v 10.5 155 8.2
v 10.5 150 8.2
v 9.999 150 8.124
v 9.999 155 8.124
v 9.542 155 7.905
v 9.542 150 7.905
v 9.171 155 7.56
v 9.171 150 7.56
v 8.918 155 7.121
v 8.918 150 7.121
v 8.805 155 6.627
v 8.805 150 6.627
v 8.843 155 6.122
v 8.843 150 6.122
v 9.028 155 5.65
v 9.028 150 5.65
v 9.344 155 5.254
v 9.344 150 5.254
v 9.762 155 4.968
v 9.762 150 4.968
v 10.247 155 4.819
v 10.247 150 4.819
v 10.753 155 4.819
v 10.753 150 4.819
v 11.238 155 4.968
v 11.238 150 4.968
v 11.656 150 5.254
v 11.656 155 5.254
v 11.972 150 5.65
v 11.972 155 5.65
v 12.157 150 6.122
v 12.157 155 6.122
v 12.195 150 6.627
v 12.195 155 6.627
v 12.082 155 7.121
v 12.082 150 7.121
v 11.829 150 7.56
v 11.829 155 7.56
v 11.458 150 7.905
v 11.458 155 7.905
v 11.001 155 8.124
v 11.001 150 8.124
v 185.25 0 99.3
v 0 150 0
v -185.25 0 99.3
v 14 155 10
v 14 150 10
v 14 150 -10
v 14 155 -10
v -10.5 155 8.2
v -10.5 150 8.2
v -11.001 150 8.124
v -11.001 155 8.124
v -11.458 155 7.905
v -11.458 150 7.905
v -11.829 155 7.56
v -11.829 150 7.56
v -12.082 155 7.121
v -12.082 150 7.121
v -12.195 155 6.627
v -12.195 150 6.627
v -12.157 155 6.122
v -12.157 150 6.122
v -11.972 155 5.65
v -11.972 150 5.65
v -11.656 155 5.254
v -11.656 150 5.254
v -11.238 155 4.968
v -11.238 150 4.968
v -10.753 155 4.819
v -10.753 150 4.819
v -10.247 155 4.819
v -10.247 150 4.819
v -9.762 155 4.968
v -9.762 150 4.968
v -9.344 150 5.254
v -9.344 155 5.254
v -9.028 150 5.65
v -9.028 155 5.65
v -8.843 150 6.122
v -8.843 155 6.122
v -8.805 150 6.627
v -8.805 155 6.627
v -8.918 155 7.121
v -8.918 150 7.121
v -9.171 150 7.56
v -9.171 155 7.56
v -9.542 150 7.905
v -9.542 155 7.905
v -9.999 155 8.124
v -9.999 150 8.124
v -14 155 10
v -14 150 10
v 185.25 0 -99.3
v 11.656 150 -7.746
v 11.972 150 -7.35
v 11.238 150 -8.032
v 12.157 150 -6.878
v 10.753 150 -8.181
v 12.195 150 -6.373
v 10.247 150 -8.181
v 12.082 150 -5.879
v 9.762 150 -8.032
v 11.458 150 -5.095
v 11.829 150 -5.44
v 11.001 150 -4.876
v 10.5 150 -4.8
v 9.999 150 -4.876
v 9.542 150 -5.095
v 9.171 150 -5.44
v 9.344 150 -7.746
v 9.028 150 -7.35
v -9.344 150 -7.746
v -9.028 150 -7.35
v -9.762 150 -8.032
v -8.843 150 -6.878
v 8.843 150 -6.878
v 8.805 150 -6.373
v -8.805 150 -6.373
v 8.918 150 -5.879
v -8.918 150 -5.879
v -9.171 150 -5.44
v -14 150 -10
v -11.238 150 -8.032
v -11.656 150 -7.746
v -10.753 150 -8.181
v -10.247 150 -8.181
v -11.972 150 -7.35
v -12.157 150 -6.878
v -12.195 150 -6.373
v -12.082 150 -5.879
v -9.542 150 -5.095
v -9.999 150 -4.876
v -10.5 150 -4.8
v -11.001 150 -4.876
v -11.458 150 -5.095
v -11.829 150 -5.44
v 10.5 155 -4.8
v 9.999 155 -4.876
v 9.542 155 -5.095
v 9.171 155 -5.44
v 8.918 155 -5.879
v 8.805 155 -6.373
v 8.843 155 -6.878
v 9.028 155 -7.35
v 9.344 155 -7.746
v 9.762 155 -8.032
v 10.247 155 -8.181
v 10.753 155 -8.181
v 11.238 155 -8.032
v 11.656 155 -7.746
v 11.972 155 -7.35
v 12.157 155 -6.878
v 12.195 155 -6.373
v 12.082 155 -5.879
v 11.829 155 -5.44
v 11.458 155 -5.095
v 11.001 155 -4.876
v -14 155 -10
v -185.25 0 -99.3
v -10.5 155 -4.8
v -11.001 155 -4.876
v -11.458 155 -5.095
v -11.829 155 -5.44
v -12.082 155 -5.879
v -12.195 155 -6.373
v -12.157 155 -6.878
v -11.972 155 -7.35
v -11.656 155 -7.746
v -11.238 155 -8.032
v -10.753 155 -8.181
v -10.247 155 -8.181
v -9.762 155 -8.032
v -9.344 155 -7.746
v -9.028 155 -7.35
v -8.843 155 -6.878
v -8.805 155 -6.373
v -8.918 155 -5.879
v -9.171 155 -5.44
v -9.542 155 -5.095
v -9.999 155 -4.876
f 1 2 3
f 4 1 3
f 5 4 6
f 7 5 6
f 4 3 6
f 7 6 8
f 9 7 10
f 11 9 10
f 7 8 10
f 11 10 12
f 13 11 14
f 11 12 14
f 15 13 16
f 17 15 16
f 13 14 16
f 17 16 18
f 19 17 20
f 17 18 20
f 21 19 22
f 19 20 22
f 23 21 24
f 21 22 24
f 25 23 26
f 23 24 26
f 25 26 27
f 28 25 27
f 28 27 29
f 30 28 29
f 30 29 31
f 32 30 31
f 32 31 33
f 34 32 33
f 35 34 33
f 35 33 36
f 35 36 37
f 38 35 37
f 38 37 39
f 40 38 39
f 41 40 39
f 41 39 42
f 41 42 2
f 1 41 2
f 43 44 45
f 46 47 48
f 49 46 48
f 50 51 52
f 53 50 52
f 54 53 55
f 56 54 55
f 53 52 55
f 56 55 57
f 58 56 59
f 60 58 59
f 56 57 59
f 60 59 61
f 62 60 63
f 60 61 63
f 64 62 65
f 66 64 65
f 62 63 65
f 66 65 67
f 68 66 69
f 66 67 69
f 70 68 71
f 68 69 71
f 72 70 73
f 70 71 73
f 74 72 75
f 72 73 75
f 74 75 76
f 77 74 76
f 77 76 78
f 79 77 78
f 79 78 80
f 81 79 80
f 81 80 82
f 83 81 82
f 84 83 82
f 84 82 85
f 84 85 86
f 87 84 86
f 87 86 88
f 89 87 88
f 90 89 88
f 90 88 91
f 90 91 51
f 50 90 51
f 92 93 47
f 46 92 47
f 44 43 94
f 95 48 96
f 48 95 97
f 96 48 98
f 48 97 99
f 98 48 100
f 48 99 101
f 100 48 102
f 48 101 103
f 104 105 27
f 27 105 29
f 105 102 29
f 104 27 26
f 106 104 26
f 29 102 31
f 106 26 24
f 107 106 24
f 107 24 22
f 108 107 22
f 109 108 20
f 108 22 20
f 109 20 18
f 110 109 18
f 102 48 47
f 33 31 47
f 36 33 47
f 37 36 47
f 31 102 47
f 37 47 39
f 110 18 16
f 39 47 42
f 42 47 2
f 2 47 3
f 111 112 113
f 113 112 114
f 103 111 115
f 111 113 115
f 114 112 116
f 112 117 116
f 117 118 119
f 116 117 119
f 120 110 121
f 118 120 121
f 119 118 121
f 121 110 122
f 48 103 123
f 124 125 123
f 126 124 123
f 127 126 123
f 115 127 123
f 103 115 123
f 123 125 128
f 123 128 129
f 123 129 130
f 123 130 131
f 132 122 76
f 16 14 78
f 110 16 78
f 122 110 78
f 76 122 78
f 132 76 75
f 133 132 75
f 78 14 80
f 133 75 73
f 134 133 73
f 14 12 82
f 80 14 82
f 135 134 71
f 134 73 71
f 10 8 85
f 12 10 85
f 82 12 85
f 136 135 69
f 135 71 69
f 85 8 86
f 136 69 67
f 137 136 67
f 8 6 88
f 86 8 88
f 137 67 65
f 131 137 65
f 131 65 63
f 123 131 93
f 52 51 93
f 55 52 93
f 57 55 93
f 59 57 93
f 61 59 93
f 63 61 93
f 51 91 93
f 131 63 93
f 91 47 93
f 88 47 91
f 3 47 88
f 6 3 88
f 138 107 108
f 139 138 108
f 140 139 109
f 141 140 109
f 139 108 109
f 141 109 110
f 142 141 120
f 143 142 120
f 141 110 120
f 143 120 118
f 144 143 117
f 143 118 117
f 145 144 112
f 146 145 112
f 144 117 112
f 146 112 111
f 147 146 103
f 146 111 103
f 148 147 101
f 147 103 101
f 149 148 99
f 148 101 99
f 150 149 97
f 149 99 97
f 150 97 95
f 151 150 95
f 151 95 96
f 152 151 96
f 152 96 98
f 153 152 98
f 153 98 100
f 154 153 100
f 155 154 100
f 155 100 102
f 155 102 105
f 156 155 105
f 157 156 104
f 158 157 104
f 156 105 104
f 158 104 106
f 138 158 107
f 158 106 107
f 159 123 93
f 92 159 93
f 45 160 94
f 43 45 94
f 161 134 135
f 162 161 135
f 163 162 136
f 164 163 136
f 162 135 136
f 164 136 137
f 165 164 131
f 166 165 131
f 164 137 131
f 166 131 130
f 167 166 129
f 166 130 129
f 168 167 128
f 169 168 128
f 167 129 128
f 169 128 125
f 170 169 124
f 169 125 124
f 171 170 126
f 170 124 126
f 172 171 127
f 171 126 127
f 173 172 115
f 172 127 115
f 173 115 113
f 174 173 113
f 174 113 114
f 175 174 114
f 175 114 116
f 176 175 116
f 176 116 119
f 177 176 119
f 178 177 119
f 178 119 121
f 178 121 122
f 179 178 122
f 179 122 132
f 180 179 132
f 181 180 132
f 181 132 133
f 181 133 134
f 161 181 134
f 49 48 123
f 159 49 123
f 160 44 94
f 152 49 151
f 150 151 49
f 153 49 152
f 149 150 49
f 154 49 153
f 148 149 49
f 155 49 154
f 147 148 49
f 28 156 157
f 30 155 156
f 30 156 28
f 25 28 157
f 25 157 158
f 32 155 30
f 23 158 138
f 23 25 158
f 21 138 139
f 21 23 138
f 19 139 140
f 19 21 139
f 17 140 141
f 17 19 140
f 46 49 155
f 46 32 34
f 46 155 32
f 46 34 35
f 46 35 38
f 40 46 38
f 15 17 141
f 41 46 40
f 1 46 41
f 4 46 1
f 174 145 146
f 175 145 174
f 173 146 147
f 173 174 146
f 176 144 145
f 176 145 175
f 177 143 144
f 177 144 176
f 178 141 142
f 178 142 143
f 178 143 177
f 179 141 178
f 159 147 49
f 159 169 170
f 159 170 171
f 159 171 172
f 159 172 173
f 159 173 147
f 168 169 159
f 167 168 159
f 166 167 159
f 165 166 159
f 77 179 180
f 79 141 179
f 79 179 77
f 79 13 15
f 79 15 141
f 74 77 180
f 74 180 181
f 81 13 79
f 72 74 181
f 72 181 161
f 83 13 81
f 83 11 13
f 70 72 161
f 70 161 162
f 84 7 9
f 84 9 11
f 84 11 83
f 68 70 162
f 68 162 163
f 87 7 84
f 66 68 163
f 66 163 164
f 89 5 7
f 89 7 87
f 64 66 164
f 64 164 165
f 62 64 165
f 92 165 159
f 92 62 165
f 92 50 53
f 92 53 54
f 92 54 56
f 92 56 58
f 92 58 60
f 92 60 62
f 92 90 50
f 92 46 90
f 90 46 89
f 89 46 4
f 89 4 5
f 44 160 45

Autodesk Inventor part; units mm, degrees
ref_plane "YZ Plane" through (0, 0, 0) normal (1, 0, 0) x (0, 1, 0)
ref_plane "XY Plane" through (0, 0, 0) normal (0, 0, 1) x (1, 0, 0)
sketch "Sketch2" plane through (0, 0, 0) normal (0, 1, 0) x (-1, 0, 0)
  line L0 (185.25, 99.3) -> (-185.25, 99.3)
  line L1 (-185.25, 99.3) -> (-185.25, -99.3)
  line L2 (-185.25, -99.3) -> (185.25, -99.3)
  line L3 (185.25, -99.3) -> (185.25, 99.3)
  line L4 (185.25, 0) -> (-185.25, 0) construction
  line L5 (0, 99.3) -> (0, -99.3) construction
  point P0 (0, 0)
  point P1 (0, 0)
  dimension "d0" = 370.5
  dimension "d1" = 198.6
ref_plane "Work Plane1" through (0, 150, 0) normal (0, 1, 0) x (-1, 0, 0)
sketch "Sketch3" plane through (0, 150, 0) normal (0, 1, 0) x (-1, 0, 0)
  line L0 (-185.25, 99.3) -> (-185.25, -99.3) projected
  line L1 (185.25, 99.3) -> (-185.25, 99.3) projected
  line L2 (185.25, -99.3) -> (185.25, 99.3) projected
  line L3 (-185.25, -99.3) -> (185.25, -99.3) projected
  point P0 (0, 0)
  point P1 (0, 0)
loft "Loft1" add profiles "Sketch2" section 2 point at (0, 150, 0)
sketch "Sketch4" plane through (0, 150, 0) normal (0, 1, 0) x (-1, 0, 0)
  line L0 (14, 10) -> (-14, 10)
  line L1 (-14, 10) -> (-14, -10)
  line L2 (-14, -10) -> (14, -10)
  line L3 (14, -10) -> (14, 10)
  line L4 (14, 10) -> (-14, -10) construction
  line L5 (-14, 10) -> (14, -10) construction
  point P0 (0, 0)
  point P1 (0, 0)
  dimension "d7" = 28
  dimension "d8" = 20
extrude "Extrusion1" add sketch "Sketch4" along normal blind 5
sketch "Sketch5" plane through (0, 155, 0) normal (0, 1, 0) x (1, 0, 0)
  line L0 (-185.25, -99.3) -> (0, 0) projected
  line L1 (10.5, -6.5) -> (-10.5, 6.5) construction
  line L2 (-10.5, -6.5) -> (10.5, 6.5) construction
  dimension "d11" = 21
  dimension "d12" = 13
hole "Hole1" at (10.5, 155, 6.5) at (-10.5, 155, 6.5) at (10.5, 155, -6.5) at (-10.5, 155, -6.5) direction (0, -1, 0) diameter 3.4 depth 8 tip angle 118
sketch "Sketch6" plane through (0, 150, 0) normal (0, -1, 0) x (1, 0, 0)
  line L0 (-1, -0.5) -> (1, -0.5)
  line L1 (1, -0.5) -> (1, 0.5)
  line L2 (1, 0.5) -> (-1, 0.5)
  line L3 (-1, 0.5) -> (-1, -0.5)
  line L4 (-1, -0.5) -> (1, 0.5) construction
  line L5 (1, -0.5) -> (-1, 0.5) construction
  point P0 (0, 0)
  dimension "d20" = 2
  dimension "d21" = 1
extrude "Extrusion2" [suppressed]
sketch "Sketch7" plane through (1, -50, 0.5) normal (1, 0, 0) x (0, 0, -1)
  line L0 (1, 0) -> (0, 0) projected
  line L1 (0.5, 0) -> (0.5, 200)
  line L2 (1, 200) -> (1, 0) projected
  point P0 (0.5, 50)
properties part number "cam vision"
